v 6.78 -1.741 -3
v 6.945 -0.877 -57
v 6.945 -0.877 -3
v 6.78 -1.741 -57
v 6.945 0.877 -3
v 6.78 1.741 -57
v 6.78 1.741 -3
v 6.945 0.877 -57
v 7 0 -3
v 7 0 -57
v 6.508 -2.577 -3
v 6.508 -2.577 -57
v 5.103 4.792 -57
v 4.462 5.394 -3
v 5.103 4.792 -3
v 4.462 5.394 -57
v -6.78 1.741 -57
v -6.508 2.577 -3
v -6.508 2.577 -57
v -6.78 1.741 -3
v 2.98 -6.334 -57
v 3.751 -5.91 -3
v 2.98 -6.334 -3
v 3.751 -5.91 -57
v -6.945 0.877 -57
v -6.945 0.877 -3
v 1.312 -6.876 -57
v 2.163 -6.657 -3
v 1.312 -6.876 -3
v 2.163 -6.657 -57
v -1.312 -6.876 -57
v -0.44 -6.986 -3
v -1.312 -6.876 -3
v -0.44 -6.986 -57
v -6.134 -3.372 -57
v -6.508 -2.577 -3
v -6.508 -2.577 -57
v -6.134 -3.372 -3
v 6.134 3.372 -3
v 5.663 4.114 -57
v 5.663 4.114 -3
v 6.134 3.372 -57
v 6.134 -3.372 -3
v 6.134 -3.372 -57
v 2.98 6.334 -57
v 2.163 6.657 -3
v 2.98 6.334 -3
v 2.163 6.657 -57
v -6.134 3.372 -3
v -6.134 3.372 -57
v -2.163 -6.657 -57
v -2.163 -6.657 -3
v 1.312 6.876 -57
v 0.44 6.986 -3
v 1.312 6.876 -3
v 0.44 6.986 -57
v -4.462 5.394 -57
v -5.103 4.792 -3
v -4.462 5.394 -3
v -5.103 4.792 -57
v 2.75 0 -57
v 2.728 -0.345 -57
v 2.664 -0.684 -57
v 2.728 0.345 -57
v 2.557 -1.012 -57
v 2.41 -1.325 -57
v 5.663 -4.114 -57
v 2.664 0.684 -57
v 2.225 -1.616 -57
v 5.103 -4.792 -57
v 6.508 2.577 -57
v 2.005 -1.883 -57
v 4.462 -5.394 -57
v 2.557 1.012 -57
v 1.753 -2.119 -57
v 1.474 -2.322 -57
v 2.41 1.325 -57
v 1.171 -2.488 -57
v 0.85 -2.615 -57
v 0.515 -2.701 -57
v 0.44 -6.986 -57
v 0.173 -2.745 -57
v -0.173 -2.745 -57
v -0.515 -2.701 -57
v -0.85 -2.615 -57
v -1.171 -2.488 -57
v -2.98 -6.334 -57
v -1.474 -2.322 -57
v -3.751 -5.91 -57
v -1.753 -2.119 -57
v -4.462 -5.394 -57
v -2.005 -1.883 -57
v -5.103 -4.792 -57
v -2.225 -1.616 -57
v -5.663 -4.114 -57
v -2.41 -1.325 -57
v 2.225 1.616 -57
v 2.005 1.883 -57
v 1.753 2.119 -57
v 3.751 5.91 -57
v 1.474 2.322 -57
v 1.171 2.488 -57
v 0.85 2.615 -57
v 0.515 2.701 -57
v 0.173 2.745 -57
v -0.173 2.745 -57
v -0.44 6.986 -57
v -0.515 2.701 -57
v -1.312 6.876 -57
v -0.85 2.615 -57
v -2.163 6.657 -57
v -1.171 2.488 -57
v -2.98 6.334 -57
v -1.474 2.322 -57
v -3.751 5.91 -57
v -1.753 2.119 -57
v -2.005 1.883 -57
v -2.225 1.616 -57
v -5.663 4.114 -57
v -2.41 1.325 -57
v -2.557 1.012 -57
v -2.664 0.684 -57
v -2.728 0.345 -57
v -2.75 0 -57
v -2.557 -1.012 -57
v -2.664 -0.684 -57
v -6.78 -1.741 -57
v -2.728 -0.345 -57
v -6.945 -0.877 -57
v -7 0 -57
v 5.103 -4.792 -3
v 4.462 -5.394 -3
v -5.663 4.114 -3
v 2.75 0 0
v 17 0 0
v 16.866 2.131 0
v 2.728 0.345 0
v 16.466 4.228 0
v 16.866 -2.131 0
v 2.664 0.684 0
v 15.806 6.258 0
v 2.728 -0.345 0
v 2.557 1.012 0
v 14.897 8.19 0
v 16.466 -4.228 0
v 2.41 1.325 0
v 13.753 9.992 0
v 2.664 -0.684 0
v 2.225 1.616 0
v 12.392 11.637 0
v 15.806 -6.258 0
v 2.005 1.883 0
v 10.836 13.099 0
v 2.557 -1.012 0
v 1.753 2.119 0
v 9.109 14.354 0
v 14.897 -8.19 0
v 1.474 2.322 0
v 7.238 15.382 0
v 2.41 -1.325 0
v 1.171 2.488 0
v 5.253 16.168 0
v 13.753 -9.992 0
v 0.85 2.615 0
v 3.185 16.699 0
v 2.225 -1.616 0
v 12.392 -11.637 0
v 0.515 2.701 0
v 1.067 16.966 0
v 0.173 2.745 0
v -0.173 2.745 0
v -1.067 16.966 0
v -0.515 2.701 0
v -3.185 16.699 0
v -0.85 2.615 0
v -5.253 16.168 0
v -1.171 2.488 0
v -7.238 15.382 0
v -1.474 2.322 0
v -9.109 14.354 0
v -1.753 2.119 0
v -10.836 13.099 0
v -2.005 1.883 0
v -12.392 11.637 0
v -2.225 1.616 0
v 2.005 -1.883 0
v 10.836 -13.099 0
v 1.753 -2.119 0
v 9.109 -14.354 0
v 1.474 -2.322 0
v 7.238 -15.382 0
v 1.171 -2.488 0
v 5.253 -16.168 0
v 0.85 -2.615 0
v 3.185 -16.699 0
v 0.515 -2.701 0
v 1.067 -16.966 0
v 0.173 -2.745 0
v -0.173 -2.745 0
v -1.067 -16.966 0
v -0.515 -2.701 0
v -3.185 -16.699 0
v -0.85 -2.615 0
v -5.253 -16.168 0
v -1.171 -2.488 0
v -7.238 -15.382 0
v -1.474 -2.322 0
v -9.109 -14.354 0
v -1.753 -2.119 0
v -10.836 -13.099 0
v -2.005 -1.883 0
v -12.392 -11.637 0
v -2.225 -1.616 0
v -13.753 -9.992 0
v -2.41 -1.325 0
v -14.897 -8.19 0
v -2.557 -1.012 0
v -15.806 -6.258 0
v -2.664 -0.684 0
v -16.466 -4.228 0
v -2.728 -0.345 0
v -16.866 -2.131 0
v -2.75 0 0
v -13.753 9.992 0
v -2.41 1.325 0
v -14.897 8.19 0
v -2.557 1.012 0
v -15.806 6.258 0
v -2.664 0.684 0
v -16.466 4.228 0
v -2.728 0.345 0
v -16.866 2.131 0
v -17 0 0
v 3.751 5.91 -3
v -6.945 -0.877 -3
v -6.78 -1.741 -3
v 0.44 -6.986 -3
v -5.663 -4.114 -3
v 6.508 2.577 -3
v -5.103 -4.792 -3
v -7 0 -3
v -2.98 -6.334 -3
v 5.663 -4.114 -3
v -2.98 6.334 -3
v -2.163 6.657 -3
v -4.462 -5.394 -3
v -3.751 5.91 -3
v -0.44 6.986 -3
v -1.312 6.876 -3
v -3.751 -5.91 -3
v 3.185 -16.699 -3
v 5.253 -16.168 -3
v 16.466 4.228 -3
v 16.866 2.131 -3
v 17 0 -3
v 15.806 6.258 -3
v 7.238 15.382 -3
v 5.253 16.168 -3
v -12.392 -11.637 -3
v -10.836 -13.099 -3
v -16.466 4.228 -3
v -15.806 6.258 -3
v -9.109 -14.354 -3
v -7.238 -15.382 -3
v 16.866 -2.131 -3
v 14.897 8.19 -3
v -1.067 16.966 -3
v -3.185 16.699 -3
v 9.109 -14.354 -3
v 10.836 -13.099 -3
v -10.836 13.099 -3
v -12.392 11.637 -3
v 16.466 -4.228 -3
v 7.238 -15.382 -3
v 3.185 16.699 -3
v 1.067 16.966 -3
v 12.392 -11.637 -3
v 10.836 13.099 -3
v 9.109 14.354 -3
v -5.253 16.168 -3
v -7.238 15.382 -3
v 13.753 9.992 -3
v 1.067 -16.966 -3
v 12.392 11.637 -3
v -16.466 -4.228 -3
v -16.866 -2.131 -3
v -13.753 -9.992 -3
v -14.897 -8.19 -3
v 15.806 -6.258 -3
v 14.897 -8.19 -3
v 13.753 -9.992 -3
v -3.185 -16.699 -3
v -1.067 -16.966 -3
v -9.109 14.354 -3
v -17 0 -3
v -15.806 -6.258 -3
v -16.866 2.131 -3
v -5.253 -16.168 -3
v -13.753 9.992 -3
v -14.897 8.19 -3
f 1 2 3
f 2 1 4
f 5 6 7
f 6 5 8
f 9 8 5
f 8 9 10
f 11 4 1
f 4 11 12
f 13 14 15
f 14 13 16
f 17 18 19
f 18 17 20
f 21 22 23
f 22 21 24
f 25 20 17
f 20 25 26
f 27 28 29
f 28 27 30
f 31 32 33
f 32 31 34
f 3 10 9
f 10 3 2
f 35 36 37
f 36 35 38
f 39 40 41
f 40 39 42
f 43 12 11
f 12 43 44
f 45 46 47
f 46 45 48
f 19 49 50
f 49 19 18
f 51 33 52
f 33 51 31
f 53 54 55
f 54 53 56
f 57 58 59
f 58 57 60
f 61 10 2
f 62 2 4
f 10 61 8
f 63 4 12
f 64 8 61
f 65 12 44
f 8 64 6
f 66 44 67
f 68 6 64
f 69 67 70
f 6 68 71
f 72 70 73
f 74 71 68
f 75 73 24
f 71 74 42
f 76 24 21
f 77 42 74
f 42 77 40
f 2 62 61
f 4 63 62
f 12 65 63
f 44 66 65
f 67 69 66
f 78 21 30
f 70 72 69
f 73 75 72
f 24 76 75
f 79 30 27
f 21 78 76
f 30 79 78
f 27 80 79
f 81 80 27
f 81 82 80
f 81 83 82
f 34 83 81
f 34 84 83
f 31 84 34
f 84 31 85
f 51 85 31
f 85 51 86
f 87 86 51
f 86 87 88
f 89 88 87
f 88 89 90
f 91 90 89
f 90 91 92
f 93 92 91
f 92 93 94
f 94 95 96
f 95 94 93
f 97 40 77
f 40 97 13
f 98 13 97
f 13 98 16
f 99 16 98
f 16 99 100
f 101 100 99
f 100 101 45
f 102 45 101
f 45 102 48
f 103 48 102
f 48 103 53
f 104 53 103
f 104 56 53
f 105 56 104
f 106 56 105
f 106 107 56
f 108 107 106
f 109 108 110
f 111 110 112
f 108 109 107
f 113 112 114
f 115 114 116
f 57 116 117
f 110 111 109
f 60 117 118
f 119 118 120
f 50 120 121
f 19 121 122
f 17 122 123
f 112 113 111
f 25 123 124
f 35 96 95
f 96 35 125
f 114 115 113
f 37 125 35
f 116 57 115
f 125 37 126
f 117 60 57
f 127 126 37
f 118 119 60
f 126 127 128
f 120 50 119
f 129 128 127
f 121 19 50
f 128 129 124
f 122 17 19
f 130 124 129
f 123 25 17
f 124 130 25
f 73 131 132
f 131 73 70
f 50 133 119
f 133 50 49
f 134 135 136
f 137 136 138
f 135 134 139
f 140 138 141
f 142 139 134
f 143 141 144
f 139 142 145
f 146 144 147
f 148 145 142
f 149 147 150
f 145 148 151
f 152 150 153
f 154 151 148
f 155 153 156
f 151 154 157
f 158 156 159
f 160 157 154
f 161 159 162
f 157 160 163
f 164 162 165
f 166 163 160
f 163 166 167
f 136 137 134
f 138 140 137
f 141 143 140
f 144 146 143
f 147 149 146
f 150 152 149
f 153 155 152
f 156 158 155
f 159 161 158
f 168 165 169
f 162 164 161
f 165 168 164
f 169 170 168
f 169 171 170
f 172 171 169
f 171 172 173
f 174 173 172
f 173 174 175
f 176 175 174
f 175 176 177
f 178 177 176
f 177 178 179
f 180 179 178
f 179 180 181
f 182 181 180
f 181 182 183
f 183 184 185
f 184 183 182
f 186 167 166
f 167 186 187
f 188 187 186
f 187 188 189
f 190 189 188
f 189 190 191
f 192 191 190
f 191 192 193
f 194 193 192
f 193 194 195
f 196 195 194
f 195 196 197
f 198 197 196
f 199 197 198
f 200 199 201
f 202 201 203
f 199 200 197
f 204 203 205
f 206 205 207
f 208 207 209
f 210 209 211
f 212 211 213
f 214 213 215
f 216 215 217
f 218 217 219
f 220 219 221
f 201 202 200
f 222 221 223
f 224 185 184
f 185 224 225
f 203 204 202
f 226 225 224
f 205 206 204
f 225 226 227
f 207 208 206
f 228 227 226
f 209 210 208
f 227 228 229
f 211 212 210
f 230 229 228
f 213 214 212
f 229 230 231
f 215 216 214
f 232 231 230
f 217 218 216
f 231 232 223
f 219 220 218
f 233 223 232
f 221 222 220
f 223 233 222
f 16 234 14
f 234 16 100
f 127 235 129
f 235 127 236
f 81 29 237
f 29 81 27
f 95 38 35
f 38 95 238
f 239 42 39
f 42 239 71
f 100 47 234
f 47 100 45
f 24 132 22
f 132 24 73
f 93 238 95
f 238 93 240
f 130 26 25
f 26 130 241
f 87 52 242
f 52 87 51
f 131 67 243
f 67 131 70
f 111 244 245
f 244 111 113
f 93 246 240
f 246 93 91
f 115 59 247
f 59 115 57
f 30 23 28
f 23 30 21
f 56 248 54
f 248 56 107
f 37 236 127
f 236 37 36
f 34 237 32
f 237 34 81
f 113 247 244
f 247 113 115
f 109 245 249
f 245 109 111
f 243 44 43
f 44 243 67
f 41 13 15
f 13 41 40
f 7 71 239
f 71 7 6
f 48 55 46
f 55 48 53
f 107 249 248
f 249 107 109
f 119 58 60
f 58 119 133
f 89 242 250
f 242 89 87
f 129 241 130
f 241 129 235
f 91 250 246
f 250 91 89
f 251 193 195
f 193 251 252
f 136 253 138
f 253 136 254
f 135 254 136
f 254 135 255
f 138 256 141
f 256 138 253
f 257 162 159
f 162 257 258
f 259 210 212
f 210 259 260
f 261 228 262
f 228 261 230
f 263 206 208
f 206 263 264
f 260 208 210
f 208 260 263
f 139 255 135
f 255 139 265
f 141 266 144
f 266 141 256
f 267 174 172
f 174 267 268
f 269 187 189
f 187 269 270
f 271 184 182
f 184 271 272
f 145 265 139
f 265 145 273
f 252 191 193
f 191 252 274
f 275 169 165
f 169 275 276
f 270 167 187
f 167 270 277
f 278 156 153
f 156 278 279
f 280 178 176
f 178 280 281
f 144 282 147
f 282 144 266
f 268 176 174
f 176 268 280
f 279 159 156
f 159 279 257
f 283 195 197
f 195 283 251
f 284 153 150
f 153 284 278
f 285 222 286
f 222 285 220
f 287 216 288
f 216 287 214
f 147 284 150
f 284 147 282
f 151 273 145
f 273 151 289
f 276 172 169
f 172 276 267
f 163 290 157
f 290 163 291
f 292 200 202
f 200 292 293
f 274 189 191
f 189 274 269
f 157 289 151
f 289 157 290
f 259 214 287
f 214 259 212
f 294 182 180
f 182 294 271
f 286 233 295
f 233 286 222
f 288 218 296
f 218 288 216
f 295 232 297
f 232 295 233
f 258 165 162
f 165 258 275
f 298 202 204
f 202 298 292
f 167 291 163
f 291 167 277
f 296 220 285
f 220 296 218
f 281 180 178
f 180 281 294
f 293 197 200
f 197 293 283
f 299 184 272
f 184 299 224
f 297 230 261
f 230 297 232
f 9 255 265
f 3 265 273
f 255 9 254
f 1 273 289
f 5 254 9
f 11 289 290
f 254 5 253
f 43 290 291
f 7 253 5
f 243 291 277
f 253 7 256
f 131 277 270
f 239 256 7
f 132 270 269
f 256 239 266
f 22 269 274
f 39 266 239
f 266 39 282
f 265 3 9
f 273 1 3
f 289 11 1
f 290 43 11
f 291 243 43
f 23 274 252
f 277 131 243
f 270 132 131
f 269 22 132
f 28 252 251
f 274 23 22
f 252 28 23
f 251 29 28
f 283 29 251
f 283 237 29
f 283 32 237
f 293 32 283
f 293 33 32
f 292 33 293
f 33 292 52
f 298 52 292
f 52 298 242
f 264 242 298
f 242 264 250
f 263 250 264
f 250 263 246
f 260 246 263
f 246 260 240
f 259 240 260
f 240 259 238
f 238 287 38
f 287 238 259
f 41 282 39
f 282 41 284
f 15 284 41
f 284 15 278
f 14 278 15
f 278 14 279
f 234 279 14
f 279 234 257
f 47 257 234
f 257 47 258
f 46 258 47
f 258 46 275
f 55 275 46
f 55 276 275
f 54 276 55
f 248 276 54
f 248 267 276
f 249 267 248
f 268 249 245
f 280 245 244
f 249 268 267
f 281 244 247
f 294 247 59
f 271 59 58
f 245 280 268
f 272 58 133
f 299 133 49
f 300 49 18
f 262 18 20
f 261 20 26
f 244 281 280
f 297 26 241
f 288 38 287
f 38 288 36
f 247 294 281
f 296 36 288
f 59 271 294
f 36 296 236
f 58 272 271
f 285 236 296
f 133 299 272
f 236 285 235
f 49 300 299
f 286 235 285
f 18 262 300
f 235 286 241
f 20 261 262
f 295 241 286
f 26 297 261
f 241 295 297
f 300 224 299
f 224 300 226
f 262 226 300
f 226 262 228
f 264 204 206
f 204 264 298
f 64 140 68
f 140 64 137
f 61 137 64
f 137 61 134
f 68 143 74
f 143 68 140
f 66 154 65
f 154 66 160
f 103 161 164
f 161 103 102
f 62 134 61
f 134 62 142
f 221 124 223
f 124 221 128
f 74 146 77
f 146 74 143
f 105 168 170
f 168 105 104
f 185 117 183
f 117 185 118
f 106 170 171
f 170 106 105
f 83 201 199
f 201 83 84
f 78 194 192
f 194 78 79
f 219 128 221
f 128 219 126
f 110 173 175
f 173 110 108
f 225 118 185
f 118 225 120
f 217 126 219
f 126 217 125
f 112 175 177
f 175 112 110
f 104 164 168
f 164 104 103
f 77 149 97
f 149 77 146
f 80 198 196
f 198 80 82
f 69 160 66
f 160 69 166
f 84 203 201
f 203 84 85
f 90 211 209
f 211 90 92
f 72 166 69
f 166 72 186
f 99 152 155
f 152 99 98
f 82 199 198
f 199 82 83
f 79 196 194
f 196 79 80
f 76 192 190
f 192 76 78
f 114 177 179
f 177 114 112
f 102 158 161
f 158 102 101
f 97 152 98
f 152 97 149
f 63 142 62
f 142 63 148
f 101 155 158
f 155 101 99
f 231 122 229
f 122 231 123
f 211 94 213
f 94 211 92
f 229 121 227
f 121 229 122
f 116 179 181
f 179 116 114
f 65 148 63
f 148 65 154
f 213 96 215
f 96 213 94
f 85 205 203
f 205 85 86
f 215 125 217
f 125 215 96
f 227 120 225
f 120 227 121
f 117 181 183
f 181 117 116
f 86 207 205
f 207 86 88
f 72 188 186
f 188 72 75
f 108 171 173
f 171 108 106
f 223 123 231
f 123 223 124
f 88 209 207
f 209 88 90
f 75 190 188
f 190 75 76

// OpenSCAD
$fn = 50;


difference() {
	union() {
		translate(v = [0, 0, -57.0000000000]) {
			cylinder(h = 57, r = 7.0000000000);
		}
		translate(v = [0, 0, -3.0000000000]) {
			cylinder(h = 3, r = 17.0000000000);
		}
	}
	union() {
		#translate(v = [0, 0, -57]) {
			cylinder(h = 57, r = 2.7500000000);
		}
	}
}
